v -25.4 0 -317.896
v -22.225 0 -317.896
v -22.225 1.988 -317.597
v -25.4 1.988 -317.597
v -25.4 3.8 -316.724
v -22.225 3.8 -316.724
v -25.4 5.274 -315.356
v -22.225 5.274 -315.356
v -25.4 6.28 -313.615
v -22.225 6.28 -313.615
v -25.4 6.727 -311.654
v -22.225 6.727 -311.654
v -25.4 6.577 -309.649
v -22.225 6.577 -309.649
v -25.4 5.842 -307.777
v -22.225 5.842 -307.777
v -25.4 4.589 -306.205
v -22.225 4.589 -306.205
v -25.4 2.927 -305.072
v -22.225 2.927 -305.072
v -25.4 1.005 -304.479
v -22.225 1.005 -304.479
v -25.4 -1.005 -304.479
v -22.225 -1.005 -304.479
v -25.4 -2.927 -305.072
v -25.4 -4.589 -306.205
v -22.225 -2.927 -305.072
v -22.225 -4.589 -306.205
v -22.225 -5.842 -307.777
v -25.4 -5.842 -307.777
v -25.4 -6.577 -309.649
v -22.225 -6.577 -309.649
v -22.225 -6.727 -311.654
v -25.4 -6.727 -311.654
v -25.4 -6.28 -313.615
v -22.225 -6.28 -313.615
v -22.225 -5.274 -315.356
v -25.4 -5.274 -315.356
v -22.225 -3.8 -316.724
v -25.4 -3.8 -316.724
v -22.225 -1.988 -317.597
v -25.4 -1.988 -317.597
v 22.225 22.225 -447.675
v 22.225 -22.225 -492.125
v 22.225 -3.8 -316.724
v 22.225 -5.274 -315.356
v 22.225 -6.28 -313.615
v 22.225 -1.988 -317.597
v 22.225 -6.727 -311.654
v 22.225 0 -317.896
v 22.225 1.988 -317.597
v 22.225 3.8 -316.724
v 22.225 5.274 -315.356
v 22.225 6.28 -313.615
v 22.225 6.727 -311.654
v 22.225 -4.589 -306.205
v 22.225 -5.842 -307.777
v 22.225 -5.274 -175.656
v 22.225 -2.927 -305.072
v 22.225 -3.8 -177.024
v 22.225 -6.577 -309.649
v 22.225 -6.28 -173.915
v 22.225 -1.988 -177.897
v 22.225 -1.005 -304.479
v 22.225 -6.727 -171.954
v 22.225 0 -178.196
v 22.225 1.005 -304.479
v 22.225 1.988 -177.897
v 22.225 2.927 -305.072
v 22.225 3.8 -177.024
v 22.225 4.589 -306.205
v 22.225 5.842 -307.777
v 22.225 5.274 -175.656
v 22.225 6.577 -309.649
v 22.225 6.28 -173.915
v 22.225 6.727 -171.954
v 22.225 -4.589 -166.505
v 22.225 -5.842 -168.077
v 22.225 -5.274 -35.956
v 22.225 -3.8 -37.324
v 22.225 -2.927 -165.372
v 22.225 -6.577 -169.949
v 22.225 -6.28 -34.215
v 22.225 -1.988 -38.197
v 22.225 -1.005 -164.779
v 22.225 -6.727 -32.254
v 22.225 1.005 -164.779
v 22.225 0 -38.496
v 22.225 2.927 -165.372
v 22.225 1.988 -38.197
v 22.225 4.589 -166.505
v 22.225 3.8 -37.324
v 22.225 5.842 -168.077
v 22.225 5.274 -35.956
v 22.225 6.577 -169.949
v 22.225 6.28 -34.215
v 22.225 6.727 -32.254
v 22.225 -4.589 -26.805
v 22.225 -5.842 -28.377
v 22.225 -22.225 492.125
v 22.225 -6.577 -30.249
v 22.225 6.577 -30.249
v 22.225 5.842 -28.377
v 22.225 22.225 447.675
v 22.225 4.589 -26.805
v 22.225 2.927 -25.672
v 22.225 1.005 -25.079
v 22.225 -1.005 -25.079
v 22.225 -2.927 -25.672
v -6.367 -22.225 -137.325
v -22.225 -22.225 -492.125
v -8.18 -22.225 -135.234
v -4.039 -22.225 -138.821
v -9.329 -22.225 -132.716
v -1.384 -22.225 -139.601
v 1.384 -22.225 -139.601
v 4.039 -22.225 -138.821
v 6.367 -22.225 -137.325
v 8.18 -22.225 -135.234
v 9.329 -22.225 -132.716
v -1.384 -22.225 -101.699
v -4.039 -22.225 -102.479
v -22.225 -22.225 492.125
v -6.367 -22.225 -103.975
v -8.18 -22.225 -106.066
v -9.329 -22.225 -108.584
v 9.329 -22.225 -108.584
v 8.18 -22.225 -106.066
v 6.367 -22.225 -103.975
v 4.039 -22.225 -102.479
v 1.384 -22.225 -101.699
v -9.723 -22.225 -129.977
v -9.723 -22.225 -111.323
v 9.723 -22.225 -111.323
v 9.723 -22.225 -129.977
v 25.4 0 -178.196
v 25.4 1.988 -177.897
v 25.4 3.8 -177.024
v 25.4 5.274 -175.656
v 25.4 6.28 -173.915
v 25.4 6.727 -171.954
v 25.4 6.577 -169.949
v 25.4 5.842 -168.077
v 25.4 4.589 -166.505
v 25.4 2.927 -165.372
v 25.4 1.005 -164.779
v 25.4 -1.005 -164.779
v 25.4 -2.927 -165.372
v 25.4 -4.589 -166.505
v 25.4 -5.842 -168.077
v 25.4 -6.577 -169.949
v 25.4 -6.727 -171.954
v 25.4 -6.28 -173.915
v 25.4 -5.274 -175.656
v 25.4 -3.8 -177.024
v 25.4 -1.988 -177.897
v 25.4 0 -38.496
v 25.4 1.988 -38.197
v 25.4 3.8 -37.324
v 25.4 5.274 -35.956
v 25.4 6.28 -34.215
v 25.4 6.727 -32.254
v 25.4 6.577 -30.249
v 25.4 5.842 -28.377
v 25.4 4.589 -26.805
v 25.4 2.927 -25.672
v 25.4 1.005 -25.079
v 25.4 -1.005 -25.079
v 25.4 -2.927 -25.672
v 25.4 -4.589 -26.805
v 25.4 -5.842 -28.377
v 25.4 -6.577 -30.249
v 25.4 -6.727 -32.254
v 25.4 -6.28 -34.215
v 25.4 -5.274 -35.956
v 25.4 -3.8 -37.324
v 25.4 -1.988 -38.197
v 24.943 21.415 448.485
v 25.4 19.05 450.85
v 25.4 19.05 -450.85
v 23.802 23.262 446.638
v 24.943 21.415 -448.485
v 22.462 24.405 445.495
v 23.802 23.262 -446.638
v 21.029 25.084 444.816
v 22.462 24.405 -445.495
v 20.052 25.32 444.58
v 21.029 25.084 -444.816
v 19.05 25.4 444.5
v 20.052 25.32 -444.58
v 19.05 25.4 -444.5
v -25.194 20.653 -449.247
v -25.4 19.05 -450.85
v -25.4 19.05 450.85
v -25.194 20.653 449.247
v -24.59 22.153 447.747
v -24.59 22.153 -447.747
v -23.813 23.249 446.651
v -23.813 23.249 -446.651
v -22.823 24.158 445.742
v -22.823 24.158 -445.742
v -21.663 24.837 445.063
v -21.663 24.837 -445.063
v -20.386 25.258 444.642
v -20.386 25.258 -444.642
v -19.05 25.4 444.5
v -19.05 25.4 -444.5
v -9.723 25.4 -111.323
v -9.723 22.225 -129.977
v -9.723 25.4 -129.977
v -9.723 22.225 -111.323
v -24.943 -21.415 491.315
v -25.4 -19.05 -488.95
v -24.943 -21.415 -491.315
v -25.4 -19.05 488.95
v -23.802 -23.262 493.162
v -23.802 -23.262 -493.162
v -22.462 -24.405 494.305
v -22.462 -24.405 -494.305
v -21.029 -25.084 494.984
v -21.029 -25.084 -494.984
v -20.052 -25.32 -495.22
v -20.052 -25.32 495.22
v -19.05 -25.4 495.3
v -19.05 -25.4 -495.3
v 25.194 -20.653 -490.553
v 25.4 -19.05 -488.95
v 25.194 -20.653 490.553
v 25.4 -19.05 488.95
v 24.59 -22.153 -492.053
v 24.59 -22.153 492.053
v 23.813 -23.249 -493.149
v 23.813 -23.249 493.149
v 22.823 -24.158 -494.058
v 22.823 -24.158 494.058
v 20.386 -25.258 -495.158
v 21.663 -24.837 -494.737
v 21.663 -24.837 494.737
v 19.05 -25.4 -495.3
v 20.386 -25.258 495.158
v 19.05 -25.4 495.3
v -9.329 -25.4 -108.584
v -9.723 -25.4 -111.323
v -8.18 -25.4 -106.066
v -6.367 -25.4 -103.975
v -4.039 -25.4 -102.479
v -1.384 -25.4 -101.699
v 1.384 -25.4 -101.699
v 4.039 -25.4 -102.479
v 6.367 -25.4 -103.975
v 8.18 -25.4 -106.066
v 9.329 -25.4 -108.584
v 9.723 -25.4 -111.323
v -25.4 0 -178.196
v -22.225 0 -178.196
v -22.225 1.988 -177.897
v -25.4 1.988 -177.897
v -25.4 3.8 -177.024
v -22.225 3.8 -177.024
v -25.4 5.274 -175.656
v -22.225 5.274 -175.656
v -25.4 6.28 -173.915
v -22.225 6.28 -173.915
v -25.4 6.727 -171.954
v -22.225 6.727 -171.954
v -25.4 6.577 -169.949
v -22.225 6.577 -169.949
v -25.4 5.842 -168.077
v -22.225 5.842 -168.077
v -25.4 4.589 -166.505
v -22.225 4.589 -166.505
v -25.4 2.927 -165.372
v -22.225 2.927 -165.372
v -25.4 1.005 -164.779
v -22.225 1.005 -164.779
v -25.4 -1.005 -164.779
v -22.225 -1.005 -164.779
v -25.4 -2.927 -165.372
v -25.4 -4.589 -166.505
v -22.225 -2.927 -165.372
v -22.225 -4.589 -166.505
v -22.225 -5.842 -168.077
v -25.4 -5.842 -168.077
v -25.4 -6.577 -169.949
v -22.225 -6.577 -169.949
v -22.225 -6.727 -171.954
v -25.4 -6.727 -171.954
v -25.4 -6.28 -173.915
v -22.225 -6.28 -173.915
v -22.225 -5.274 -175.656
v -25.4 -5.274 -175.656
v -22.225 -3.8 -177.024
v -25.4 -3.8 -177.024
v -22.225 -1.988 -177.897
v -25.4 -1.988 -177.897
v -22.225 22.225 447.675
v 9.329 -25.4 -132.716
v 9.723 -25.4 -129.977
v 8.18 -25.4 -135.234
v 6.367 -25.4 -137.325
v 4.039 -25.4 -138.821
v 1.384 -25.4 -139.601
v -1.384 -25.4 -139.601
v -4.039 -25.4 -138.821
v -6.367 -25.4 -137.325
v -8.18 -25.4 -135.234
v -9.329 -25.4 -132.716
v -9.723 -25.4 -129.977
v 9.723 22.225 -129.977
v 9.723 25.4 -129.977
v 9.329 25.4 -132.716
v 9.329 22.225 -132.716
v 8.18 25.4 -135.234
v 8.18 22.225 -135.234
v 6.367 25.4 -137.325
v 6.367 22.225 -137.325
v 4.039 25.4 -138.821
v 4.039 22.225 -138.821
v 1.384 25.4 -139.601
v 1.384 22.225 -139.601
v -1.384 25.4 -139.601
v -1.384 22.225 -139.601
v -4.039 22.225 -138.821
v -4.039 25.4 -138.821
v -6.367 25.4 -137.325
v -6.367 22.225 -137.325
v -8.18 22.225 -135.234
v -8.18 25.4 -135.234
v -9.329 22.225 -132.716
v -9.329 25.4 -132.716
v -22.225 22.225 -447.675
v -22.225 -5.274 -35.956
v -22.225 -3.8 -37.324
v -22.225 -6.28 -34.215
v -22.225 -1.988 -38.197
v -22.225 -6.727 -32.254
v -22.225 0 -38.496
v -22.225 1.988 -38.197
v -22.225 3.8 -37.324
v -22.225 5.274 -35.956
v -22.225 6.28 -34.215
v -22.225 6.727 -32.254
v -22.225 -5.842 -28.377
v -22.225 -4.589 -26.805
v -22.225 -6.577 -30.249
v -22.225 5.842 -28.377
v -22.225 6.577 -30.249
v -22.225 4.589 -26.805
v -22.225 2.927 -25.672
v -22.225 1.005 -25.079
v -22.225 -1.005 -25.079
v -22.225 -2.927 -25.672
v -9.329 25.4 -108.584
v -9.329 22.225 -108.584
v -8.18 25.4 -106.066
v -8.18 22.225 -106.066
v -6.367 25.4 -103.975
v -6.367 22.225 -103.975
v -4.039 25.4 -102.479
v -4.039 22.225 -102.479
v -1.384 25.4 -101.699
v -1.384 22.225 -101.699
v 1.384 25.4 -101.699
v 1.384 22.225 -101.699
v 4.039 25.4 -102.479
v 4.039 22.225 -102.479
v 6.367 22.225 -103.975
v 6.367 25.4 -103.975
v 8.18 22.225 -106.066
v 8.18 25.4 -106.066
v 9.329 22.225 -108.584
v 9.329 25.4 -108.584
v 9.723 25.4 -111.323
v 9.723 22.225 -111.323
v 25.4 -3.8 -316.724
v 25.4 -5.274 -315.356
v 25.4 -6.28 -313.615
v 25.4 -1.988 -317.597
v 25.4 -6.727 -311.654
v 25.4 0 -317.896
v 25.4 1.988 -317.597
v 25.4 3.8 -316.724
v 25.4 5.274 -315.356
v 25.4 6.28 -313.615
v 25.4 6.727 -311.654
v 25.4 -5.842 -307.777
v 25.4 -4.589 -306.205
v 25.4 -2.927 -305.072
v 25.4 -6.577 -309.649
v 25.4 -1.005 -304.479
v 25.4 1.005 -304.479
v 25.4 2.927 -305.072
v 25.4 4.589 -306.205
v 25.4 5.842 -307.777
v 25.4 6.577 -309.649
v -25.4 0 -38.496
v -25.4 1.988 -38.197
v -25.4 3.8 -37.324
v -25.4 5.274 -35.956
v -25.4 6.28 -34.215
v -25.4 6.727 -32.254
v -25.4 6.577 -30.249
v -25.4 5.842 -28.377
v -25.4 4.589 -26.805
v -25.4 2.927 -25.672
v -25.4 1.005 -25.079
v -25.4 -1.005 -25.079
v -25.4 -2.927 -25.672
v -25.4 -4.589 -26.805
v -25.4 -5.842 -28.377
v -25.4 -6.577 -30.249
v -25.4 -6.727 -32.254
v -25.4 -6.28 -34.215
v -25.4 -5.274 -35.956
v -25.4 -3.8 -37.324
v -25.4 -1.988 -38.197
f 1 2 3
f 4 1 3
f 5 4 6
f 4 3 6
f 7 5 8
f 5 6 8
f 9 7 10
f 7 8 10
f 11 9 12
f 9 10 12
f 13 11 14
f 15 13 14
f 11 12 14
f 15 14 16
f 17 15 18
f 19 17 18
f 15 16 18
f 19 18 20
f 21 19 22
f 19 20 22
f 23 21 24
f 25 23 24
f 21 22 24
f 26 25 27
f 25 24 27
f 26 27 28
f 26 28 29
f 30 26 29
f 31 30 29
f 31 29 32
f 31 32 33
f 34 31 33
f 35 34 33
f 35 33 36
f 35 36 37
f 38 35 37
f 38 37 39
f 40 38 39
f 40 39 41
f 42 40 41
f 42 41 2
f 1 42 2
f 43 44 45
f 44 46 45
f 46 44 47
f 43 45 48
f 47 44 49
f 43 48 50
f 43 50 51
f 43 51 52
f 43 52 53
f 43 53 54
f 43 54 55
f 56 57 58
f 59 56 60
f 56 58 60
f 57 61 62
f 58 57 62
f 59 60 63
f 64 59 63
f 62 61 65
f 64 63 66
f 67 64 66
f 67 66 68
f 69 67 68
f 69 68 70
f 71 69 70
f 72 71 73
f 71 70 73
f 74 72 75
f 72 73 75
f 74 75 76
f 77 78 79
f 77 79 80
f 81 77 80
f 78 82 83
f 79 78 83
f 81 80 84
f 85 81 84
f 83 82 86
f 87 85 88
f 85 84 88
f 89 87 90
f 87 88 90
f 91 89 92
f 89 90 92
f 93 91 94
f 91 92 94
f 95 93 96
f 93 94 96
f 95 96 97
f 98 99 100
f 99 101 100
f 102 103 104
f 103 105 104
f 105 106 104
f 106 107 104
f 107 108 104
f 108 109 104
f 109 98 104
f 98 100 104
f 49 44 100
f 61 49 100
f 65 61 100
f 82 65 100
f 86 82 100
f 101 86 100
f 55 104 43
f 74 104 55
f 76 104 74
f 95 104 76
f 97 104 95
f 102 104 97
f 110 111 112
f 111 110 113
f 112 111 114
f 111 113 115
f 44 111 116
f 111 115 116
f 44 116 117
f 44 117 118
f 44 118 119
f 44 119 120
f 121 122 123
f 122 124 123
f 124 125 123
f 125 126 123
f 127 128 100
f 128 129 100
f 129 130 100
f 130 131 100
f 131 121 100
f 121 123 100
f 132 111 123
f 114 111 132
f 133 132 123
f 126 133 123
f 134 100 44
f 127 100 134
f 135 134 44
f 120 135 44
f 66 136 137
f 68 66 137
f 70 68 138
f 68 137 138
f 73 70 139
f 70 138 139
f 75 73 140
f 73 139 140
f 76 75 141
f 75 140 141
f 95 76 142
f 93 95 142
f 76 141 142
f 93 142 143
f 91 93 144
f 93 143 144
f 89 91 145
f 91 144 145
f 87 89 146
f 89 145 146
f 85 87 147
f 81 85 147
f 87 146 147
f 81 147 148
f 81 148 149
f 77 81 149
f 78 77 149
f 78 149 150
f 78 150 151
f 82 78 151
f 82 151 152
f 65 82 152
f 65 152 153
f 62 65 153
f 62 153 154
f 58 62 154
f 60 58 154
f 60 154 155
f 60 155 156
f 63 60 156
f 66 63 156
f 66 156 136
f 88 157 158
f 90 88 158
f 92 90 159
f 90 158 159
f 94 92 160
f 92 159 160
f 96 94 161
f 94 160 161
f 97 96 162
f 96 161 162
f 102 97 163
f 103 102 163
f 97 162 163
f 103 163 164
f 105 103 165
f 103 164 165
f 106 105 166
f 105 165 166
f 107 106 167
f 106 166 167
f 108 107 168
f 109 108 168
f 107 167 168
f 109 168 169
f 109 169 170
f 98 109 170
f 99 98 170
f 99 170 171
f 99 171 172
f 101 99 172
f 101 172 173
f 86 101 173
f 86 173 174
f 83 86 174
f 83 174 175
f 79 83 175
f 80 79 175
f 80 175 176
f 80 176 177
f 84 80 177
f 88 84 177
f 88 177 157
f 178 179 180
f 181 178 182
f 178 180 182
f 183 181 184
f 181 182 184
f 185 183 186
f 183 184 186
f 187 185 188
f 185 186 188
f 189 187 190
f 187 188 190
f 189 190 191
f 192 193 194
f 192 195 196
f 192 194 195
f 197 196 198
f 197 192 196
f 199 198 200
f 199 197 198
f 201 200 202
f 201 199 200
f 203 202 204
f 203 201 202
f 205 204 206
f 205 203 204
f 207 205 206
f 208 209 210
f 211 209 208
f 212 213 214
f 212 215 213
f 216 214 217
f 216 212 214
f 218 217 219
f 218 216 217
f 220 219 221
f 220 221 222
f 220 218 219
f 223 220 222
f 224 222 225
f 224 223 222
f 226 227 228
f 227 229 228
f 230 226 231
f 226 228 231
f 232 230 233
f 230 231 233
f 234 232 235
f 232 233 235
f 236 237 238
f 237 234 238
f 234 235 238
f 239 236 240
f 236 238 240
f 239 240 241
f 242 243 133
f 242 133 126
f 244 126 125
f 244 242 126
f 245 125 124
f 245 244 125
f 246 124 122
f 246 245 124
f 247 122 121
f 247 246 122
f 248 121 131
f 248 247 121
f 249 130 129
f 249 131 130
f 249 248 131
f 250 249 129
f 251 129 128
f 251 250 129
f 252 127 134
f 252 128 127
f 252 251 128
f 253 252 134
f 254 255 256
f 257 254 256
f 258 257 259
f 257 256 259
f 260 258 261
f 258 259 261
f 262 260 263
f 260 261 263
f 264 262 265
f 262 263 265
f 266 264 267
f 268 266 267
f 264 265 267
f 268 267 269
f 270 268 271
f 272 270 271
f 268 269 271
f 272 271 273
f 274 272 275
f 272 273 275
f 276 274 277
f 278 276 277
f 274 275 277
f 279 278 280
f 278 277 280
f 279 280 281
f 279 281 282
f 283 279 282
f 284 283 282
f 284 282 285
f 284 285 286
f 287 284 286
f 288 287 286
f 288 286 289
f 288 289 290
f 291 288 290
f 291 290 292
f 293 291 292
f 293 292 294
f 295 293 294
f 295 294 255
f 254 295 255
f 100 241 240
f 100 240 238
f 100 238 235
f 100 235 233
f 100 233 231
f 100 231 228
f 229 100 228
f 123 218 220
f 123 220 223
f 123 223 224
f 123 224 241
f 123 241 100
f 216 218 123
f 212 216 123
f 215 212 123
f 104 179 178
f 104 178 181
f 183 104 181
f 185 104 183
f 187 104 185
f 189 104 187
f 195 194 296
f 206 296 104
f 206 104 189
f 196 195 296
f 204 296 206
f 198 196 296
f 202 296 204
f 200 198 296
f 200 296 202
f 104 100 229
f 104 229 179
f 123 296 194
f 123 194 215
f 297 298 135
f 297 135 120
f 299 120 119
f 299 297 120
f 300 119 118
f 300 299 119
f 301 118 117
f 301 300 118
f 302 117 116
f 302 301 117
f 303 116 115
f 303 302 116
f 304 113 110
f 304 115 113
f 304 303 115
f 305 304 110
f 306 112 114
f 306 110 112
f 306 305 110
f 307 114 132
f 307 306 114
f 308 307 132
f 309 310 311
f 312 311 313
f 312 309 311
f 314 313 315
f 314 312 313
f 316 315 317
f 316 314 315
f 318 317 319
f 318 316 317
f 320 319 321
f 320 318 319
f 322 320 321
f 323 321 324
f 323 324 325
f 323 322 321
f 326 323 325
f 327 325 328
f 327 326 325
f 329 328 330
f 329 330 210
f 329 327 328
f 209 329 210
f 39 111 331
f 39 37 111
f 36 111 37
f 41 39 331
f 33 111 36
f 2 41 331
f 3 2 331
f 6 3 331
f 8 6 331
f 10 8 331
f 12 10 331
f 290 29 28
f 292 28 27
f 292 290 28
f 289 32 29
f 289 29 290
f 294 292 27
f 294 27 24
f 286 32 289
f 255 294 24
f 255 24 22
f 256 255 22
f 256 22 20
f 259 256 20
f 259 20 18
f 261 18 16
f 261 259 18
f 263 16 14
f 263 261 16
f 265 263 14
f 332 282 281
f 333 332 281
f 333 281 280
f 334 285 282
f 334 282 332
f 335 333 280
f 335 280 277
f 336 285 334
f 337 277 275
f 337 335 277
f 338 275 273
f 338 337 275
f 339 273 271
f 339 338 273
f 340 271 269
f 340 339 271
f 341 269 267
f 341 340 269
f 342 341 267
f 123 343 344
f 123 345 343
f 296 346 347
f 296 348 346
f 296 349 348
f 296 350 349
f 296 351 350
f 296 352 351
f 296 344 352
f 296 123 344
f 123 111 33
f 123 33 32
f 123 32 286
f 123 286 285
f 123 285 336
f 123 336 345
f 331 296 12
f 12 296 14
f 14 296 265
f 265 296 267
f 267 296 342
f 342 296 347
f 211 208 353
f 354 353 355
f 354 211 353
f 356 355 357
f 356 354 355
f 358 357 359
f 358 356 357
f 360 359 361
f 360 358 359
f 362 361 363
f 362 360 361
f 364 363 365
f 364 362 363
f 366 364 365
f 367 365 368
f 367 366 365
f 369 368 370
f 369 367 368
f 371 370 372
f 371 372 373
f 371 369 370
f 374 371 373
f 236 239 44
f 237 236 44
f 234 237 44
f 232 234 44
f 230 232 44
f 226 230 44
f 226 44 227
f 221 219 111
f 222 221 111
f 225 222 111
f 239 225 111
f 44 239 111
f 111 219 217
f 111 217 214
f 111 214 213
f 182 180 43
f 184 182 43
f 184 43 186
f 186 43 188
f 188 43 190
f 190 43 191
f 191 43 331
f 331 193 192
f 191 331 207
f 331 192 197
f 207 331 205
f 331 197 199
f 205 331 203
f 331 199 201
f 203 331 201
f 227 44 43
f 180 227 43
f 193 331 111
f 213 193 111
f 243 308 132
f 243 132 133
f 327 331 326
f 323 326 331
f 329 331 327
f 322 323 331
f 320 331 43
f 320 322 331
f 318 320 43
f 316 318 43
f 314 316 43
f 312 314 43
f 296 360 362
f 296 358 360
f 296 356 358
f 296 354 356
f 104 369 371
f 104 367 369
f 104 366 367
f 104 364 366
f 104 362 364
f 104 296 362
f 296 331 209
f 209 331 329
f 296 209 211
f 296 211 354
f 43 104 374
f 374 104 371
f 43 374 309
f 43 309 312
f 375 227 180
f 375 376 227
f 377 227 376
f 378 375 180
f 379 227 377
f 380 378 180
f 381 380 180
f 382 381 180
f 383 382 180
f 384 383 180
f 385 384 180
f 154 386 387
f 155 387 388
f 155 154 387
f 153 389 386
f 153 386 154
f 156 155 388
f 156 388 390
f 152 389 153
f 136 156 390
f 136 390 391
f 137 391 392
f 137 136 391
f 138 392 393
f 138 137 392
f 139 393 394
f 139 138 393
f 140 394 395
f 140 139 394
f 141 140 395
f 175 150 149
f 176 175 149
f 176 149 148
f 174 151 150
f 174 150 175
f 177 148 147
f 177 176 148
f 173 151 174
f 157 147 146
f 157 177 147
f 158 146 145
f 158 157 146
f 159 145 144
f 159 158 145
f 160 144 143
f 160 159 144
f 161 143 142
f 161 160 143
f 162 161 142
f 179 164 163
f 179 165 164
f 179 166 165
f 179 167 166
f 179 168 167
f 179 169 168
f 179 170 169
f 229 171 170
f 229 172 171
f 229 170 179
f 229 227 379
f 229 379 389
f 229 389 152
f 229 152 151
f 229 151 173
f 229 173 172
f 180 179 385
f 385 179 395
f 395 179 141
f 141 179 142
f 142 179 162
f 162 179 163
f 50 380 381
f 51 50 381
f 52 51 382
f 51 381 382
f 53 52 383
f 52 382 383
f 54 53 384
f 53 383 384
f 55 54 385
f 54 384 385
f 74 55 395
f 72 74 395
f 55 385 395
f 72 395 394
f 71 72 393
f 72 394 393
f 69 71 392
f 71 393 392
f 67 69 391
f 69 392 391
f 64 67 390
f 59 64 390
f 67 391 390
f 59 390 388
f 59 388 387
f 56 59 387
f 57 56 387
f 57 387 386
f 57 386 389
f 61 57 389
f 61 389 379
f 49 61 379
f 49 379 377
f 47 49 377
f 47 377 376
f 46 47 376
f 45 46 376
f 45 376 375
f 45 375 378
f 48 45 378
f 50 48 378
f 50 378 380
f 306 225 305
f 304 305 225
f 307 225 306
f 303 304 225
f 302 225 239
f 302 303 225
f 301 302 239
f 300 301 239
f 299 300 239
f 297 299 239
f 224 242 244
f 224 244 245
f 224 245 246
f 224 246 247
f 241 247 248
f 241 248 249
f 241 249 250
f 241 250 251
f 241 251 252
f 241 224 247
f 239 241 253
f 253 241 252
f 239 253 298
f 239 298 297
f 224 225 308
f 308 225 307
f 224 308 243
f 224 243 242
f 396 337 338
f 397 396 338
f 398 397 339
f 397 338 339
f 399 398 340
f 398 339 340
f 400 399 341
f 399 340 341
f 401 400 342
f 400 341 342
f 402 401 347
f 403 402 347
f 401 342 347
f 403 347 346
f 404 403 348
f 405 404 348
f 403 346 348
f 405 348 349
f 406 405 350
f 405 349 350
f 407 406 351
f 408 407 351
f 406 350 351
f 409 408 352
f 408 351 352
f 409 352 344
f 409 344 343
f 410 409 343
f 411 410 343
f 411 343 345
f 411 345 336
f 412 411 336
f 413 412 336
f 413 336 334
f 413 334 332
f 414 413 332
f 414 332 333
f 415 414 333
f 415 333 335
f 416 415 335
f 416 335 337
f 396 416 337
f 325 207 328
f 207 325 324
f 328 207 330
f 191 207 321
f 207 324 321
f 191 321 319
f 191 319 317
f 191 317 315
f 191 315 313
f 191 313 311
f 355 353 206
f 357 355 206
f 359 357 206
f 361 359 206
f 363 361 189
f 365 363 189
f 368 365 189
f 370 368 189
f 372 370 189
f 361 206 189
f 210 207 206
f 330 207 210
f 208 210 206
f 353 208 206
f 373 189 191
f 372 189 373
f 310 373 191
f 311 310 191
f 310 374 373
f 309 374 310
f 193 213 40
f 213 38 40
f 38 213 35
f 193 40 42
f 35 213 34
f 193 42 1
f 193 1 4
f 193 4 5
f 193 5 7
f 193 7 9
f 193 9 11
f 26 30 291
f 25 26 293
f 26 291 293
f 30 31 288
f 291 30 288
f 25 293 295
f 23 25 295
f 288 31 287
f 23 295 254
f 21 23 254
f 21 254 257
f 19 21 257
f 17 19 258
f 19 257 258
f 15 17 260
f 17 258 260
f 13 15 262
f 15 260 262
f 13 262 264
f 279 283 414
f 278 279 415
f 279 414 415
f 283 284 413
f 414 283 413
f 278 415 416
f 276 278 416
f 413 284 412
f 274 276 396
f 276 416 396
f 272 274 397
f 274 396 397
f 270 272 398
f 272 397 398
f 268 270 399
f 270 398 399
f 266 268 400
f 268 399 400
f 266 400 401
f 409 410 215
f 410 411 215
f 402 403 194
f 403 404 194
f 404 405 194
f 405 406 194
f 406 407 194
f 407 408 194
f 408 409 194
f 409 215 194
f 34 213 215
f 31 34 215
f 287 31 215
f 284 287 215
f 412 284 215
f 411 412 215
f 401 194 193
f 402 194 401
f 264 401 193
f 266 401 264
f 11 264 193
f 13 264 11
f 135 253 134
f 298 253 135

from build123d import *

# Parameters (mm, degrees)
SKETCH1_W                   = 50.8
SKETCH1_H                   = 50.8
SKETCH1_W_2                 = 44.45
SKETCH1_H_2                 = 44.45
BOSS_EXTRUDE1_DEPTH         = 495.3
FILLET1_R                   = 6.35
CUT_EXTRUDE1_DEPTH          = 914.4
F_1_2_CLEARANCE_HOLE1_D     = 13.49248
F_3_4_START                 = -25.4
F_3_4_CLEARANCE_SLOT1_DEPTH = 50.8


# Read off the part's stored shape, not the designer's step: 3/4 Clearance Slot1
with BuildPart() as part:
    # Sketch1 → Boss-Extrude1 (new, symmetric)
    with BuildSketch(Plane.XY):
        Rectangle(SKETCH1_W, SKETCH1_H)
        Rectangle(SKETCH1_W_2, SKETCH1_H_2, mode=Mode.SUBTRACT)
    extrude(amount=BOSS_EXTRUDE1_DEPTH, both=True)

    # Fillet1
    fillet1_edges = [part.edges().sort_by_distance(p)[0] for p in [
        (-25.4, 25.4, 0),
        (25.4, 25.4, 0),
        (25.4, -25.4, 0),
        (-25.4, -25.4, 0),
    ]]
    fillet(fillet1_edges, radius=FILLET1_R)

    # Sketch2 → Cut-Extrude1 (cut)
    with BuildSketch(Plane.ZY.offset(25.4)):
        Polygon((495.3, -25.4), (444.5, 25.4), (495.3, 25.4), align=None)
        Polygon((-495.3, 25.4), (-495.3, -25.4), (-444.5, 25.4), align=None)
    extrude(amount=-CUT_EXTRUDE1_DEPTH, mode=Mode.SUBTRACT)

    # 1/2 Clearance Hole1 (through all)
    with Locations(Plane.ZY.offset(25.4)):
        with Locations((-171.45, 0), (-311.15, 0), (-31.75, 0)):
            Hole(F_1_2_CLEARANCE_HOLE1_D / 2)

    # 3/4 Clearance Slot1 outline → 3/4 Clearance Slot1 (cut)
    with BuildSketch(Plane(origin=(0, 0, 0), x_dir=(1, 0, 0), z_dir=(0, 1, 0)).offset(F_3_4_START)):
        with BuildLine():
            ThreePointArc((9.72312, 129.97688), (0, 139.7), (-9.72312, 129.97688))
            Line((-9.72312, 129.97688), (-9.72312, 111.32312))
            ThreePointArc((-9.72312, 111.32312), (0, 101.6), (9.72312, 111.32312))
            Line((9.72312, 111.32312), (9.72312, 129.97688))
        make_face()
    extrude(amount=F_3_4_CLEARANCE_SLOT1_DEPTH, mode=Mode.SUBTRACT)


solid = part.part
